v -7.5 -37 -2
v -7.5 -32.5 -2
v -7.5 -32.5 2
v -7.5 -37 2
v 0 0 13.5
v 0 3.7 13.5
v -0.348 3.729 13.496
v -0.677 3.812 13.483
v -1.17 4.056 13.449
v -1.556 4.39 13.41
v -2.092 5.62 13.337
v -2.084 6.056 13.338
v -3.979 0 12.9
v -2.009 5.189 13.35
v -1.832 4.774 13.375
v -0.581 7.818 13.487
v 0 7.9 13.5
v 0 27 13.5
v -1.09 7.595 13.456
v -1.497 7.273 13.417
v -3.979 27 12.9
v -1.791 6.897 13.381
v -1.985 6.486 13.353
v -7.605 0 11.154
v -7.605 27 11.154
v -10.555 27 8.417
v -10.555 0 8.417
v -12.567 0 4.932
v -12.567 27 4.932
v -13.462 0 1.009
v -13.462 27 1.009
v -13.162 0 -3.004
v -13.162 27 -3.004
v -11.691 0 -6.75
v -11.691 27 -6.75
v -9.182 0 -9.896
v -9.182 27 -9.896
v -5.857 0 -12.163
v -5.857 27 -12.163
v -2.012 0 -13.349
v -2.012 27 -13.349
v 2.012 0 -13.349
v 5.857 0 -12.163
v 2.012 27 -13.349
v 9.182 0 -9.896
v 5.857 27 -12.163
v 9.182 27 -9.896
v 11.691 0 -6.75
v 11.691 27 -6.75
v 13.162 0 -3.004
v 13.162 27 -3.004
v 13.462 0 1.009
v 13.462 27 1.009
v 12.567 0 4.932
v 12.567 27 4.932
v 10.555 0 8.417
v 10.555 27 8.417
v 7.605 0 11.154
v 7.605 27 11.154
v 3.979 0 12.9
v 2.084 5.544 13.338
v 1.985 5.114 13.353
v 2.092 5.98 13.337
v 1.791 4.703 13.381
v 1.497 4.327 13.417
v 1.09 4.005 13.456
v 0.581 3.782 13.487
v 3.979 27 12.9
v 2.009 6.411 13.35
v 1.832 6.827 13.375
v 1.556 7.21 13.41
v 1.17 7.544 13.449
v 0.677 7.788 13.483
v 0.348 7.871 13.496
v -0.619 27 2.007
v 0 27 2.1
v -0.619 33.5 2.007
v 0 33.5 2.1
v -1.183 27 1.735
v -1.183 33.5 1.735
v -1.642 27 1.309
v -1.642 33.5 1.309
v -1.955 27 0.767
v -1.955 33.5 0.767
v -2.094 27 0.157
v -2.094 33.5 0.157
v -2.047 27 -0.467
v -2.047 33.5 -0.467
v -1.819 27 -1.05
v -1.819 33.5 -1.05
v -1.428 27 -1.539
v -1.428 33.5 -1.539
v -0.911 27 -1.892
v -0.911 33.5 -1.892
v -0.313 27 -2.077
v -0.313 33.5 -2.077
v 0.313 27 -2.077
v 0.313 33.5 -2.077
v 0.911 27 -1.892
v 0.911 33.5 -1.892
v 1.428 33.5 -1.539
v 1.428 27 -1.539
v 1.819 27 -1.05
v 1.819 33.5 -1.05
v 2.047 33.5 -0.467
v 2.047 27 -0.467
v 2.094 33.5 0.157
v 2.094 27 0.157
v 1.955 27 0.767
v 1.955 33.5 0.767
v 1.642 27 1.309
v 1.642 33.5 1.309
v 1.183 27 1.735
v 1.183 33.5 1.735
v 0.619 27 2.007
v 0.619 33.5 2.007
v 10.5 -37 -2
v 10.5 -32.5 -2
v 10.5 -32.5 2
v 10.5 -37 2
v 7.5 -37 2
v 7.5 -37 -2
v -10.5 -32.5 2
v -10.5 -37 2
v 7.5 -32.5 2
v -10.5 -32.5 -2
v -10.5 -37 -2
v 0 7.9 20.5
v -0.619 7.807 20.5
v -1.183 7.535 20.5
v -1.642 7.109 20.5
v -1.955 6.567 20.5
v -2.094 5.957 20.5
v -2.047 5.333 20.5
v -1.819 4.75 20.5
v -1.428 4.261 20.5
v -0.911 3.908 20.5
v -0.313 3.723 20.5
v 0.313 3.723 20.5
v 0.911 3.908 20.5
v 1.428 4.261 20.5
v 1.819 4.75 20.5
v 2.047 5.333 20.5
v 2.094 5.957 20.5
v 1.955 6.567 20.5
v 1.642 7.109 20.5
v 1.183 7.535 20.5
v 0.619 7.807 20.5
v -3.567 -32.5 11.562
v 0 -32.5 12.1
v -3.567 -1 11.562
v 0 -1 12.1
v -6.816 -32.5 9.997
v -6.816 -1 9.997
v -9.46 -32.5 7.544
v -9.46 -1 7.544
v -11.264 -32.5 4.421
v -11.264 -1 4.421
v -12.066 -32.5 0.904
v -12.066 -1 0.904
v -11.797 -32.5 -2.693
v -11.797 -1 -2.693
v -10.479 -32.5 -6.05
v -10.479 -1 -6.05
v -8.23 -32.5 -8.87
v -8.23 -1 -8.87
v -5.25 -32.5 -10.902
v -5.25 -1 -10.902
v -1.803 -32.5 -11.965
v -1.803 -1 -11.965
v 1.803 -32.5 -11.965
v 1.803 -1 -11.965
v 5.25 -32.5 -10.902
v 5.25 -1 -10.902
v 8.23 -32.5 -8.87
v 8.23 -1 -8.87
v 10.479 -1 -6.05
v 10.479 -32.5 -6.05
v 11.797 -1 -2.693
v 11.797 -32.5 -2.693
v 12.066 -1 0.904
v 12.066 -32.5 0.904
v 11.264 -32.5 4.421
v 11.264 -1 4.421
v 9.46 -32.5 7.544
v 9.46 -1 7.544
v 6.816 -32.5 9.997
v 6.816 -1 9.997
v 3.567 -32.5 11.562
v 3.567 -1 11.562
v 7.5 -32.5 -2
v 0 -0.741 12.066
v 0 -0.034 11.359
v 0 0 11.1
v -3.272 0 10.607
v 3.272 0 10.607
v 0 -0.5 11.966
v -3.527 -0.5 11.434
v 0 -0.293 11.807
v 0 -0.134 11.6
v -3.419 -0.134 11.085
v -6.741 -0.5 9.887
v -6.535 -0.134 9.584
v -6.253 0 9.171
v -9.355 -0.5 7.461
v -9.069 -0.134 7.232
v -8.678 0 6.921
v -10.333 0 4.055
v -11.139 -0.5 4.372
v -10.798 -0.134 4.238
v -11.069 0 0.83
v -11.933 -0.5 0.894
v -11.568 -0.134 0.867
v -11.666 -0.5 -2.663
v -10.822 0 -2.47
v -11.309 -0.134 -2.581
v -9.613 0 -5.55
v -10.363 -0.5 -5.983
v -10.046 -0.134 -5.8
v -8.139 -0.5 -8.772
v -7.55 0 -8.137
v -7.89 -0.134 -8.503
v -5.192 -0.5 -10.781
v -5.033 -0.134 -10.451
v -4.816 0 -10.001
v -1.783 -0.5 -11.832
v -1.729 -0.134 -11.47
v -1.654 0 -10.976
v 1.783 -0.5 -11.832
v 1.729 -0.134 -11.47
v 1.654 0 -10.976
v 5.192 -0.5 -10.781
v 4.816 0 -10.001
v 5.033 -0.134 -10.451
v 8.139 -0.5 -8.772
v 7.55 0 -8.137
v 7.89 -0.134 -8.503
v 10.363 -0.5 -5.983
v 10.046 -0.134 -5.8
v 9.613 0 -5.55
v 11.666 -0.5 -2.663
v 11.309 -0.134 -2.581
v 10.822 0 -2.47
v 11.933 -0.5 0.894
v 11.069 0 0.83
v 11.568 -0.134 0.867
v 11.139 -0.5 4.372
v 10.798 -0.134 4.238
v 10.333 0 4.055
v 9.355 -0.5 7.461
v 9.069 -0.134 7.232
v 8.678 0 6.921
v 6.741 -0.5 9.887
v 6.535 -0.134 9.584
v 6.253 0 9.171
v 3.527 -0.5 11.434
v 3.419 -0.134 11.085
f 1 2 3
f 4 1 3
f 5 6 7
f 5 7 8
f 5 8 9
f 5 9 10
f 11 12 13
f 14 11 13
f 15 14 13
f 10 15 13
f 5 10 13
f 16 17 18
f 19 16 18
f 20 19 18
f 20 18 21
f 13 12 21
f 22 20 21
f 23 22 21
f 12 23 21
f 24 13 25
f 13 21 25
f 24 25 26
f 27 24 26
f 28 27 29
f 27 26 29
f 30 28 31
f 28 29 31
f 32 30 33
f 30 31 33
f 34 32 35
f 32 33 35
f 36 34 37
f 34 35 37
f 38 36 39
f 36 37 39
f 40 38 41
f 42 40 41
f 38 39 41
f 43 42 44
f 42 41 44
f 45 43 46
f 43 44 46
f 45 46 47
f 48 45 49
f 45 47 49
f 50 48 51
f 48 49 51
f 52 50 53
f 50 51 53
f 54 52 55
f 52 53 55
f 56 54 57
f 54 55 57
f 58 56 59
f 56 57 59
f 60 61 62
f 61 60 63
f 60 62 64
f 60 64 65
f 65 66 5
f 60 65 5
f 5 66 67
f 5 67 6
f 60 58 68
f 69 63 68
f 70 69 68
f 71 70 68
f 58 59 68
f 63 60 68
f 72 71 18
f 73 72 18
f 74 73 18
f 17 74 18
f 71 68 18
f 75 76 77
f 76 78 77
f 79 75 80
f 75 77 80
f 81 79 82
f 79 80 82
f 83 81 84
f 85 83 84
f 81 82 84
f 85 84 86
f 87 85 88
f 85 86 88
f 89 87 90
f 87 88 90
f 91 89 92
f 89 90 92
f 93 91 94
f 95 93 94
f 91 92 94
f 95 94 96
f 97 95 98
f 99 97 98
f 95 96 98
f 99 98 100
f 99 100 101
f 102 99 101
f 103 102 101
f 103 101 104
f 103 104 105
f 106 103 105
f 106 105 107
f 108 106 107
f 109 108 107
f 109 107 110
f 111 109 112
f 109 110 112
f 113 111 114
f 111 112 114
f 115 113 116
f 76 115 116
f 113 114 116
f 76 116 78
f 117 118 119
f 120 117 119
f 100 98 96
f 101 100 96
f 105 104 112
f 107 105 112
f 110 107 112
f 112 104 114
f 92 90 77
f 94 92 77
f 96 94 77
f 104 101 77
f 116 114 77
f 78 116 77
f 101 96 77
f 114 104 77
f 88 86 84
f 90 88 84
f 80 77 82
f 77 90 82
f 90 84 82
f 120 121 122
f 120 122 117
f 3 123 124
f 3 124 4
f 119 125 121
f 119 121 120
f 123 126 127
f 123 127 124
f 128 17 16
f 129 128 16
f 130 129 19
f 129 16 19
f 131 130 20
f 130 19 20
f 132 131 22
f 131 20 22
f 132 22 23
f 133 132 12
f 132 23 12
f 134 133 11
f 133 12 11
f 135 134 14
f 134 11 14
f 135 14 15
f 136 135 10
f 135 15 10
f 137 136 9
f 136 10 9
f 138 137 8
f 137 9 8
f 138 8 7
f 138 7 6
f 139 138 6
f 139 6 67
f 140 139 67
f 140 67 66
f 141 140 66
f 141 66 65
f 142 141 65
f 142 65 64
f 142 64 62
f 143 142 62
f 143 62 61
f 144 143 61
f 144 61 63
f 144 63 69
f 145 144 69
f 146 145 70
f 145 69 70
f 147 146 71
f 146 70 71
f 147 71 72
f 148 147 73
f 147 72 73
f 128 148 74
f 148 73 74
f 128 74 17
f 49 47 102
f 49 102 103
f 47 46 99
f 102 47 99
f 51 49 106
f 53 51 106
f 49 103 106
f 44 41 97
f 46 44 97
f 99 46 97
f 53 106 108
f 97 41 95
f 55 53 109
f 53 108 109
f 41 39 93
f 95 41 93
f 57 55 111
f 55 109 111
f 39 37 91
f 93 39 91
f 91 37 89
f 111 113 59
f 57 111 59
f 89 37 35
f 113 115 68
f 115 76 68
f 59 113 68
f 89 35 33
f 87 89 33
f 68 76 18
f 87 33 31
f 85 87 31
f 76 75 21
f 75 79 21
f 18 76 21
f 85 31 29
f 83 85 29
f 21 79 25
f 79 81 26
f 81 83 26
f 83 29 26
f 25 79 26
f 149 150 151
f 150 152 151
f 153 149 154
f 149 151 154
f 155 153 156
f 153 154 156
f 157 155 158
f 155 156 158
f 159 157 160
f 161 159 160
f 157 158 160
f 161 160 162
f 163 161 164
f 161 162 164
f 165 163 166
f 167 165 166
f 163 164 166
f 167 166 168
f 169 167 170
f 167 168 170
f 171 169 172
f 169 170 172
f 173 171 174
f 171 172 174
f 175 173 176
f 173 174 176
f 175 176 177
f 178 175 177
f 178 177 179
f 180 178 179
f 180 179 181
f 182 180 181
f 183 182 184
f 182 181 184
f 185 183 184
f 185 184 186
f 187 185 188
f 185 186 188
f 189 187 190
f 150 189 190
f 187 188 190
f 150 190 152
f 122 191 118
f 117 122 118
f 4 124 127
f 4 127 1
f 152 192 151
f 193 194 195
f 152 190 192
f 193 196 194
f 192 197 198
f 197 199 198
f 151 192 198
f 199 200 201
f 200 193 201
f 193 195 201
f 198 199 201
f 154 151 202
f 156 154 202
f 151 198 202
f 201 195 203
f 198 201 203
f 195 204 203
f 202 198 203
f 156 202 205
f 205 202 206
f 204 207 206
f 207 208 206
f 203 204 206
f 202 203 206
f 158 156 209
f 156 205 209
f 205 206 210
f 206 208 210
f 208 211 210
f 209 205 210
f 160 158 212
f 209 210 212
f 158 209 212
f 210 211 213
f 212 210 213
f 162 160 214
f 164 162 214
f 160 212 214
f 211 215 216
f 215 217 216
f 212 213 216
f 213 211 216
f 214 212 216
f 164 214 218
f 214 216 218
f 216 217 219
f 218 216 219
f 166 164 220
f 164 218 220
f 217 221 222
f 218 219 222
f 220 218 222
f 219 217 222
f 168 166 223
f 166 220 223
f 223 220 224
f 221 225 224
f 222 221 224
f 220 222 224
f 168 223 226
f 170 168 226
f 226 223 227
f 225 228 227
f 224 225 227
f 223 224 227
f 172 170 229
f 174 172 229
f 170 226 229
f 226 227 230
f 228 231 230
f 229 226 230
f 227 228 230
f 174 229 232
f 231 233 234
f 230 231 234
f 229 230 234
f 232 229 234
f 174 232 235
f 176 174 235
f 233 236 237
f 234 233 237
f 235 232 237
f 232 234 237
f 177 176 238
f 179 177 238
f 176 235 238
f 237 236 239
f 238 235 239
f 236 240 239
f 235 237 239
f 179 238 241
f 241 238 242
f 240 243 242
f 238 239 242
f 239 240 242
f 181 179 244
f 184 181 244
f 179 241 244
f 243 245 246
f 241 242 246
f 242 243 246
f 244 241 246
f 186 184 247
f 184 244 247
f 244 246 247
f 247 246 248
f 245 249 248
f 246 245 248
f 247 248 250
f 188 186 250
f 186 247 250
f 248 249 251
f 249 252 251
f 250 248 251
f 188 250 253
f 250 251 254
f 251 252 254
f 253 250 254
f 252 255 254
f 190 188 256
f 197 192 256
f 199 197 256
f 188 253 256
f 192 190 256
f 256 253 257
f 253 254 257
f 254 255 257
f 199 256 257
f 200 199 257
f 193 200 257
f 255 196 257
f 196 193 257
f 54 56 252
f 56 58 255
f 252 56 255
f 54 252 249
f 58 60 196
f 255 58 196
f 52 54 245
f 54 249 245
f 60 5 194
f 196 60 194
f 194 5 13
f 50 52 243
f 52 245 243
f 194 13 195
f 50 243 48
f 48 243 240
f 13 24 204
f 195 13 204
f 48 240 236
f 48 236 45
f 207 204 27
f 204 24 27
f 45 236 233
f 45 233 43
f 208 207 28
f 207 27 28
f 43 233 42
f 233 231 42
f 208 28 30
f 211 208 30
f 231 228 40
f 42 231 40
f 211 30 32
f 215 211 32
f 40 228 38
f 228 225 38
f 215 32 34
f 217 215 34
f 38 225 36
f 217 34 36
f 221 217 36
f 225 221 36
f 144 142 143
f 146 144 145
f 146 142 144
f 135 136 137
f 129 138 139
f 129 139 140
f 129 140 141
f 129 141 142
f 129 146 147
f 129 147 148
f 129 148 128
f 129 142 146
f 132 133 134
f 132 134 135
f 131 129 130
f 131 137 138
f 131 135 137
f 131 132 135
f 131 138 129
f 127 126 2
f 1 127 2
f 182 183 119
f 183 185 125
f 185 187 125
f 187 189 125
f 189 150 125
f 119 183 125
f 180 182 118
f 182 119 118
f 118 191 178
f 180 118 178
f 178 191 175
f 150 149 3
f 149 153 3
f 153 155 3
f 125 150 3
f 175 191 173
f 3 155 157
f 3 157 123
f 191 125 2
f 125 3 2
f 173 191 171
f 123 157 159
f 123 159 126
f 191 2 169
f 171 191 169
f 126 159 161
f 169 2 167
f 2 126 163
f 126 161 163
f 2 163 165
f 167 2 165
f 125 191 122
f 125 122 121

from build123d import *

# Parameters (mm, degrees)
ESQUISSE2_R        = 2.1
BOSS_EXTRU_1_DEPTH = 20.5
ESQUISSE3_W        = 3
ESQUISSE3_H        = 4
BOSS_EXTRU_2_DEPTH = 4.5


with BuildPart() as part:
    # Esquisse1 → Révolution1 (revolve)
    with BuildSketch(Plane.XY, mode=Mode.PRIVATE) as r_volution1_sk:
        with BuildLine():
            Line((0, 33.5), (0, -32.5))
            Line((0, -32.5), (12.1, -32.5))
            Line((12.1, -32.5), (12.1, -1))
            ThreePointArc((12.1, -1), (11.807106781, -0.292893219), (11.1, 0))
            Line((11.1, 0), (13.5, 0))
            Line((13.5, 0), (13.5, 27))
            Line((13.5, 27), (2.1, 27))
            Line((2.1, 27), (2.1, 33.5))
            Line((2.1, 33.5), (0, 33.5))
        make_face()
    revolve(r_volution1_sk.sketch.rotate(Axis((0, 44.171548117, 0), (0, -1, 0)), 90), axis=Axis((0, 44.171548117, 0), (0, -1, 0)))

    # Esquisse2 → Boss.-Extru.1 (add)
    with BuildSketch(Plane.XY):
        with Locations(Location((0, 5.8, 0), (0, 0, 90))):
            Circle(ESQUISSE2_R)
    extrude(amount=BOSS_EXTRU_1_DEPTH)

    # Esquisse3 → Boss.-Extru.2 (add)
    with BuildSketch(Plane.XZ.offset(32.5)):
        with Locations((-9, 0)):
            Rectangle(ESQUISSE3_W, ESQUISSE3_H)
        with Locations((9, 0)):
            Rectangle(ESQUISSE3_W, ESQUISSE3_H)
    extrude(amount=BOSS_EXTRU_2_DEPTH)


solid = part.part
